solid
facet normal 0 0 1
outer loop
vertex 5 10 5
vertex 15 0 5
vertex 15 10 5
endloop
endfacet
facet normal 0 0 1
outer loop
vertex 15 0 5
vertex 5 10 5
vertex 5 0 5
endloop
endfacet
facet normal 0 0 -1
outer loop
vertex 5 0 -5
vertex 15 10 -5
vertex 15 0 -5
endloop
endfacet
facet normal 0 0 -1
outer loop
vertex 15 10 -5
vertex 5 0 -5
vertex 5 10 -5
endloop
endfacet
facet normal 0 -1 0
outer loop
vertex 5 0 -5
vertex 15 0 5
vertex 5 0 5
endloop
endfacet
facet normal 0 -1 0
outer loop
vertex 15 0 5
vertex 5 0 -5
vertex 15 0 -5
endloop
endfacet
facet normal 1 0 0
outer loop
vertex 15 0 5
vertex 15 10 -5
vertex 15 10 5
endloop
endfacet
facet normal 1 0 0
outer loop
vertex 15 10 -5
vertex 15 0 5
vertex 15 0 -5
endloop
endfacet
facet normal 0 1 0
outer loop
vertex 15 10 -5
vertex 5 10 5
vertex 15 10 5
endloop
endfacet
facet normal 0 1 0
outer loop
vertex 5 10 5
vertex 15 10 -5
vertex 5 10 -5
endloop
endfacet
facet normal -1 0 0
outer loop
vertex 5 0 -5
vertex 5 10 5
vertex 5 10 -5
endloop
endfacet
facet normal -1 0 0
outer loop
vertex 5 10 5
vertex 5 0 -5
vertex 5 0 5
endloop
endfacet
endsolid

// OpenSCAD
translate(v = [5, 0, -5]) {
	cube(size=[10, 10, 10], center=false);
}
